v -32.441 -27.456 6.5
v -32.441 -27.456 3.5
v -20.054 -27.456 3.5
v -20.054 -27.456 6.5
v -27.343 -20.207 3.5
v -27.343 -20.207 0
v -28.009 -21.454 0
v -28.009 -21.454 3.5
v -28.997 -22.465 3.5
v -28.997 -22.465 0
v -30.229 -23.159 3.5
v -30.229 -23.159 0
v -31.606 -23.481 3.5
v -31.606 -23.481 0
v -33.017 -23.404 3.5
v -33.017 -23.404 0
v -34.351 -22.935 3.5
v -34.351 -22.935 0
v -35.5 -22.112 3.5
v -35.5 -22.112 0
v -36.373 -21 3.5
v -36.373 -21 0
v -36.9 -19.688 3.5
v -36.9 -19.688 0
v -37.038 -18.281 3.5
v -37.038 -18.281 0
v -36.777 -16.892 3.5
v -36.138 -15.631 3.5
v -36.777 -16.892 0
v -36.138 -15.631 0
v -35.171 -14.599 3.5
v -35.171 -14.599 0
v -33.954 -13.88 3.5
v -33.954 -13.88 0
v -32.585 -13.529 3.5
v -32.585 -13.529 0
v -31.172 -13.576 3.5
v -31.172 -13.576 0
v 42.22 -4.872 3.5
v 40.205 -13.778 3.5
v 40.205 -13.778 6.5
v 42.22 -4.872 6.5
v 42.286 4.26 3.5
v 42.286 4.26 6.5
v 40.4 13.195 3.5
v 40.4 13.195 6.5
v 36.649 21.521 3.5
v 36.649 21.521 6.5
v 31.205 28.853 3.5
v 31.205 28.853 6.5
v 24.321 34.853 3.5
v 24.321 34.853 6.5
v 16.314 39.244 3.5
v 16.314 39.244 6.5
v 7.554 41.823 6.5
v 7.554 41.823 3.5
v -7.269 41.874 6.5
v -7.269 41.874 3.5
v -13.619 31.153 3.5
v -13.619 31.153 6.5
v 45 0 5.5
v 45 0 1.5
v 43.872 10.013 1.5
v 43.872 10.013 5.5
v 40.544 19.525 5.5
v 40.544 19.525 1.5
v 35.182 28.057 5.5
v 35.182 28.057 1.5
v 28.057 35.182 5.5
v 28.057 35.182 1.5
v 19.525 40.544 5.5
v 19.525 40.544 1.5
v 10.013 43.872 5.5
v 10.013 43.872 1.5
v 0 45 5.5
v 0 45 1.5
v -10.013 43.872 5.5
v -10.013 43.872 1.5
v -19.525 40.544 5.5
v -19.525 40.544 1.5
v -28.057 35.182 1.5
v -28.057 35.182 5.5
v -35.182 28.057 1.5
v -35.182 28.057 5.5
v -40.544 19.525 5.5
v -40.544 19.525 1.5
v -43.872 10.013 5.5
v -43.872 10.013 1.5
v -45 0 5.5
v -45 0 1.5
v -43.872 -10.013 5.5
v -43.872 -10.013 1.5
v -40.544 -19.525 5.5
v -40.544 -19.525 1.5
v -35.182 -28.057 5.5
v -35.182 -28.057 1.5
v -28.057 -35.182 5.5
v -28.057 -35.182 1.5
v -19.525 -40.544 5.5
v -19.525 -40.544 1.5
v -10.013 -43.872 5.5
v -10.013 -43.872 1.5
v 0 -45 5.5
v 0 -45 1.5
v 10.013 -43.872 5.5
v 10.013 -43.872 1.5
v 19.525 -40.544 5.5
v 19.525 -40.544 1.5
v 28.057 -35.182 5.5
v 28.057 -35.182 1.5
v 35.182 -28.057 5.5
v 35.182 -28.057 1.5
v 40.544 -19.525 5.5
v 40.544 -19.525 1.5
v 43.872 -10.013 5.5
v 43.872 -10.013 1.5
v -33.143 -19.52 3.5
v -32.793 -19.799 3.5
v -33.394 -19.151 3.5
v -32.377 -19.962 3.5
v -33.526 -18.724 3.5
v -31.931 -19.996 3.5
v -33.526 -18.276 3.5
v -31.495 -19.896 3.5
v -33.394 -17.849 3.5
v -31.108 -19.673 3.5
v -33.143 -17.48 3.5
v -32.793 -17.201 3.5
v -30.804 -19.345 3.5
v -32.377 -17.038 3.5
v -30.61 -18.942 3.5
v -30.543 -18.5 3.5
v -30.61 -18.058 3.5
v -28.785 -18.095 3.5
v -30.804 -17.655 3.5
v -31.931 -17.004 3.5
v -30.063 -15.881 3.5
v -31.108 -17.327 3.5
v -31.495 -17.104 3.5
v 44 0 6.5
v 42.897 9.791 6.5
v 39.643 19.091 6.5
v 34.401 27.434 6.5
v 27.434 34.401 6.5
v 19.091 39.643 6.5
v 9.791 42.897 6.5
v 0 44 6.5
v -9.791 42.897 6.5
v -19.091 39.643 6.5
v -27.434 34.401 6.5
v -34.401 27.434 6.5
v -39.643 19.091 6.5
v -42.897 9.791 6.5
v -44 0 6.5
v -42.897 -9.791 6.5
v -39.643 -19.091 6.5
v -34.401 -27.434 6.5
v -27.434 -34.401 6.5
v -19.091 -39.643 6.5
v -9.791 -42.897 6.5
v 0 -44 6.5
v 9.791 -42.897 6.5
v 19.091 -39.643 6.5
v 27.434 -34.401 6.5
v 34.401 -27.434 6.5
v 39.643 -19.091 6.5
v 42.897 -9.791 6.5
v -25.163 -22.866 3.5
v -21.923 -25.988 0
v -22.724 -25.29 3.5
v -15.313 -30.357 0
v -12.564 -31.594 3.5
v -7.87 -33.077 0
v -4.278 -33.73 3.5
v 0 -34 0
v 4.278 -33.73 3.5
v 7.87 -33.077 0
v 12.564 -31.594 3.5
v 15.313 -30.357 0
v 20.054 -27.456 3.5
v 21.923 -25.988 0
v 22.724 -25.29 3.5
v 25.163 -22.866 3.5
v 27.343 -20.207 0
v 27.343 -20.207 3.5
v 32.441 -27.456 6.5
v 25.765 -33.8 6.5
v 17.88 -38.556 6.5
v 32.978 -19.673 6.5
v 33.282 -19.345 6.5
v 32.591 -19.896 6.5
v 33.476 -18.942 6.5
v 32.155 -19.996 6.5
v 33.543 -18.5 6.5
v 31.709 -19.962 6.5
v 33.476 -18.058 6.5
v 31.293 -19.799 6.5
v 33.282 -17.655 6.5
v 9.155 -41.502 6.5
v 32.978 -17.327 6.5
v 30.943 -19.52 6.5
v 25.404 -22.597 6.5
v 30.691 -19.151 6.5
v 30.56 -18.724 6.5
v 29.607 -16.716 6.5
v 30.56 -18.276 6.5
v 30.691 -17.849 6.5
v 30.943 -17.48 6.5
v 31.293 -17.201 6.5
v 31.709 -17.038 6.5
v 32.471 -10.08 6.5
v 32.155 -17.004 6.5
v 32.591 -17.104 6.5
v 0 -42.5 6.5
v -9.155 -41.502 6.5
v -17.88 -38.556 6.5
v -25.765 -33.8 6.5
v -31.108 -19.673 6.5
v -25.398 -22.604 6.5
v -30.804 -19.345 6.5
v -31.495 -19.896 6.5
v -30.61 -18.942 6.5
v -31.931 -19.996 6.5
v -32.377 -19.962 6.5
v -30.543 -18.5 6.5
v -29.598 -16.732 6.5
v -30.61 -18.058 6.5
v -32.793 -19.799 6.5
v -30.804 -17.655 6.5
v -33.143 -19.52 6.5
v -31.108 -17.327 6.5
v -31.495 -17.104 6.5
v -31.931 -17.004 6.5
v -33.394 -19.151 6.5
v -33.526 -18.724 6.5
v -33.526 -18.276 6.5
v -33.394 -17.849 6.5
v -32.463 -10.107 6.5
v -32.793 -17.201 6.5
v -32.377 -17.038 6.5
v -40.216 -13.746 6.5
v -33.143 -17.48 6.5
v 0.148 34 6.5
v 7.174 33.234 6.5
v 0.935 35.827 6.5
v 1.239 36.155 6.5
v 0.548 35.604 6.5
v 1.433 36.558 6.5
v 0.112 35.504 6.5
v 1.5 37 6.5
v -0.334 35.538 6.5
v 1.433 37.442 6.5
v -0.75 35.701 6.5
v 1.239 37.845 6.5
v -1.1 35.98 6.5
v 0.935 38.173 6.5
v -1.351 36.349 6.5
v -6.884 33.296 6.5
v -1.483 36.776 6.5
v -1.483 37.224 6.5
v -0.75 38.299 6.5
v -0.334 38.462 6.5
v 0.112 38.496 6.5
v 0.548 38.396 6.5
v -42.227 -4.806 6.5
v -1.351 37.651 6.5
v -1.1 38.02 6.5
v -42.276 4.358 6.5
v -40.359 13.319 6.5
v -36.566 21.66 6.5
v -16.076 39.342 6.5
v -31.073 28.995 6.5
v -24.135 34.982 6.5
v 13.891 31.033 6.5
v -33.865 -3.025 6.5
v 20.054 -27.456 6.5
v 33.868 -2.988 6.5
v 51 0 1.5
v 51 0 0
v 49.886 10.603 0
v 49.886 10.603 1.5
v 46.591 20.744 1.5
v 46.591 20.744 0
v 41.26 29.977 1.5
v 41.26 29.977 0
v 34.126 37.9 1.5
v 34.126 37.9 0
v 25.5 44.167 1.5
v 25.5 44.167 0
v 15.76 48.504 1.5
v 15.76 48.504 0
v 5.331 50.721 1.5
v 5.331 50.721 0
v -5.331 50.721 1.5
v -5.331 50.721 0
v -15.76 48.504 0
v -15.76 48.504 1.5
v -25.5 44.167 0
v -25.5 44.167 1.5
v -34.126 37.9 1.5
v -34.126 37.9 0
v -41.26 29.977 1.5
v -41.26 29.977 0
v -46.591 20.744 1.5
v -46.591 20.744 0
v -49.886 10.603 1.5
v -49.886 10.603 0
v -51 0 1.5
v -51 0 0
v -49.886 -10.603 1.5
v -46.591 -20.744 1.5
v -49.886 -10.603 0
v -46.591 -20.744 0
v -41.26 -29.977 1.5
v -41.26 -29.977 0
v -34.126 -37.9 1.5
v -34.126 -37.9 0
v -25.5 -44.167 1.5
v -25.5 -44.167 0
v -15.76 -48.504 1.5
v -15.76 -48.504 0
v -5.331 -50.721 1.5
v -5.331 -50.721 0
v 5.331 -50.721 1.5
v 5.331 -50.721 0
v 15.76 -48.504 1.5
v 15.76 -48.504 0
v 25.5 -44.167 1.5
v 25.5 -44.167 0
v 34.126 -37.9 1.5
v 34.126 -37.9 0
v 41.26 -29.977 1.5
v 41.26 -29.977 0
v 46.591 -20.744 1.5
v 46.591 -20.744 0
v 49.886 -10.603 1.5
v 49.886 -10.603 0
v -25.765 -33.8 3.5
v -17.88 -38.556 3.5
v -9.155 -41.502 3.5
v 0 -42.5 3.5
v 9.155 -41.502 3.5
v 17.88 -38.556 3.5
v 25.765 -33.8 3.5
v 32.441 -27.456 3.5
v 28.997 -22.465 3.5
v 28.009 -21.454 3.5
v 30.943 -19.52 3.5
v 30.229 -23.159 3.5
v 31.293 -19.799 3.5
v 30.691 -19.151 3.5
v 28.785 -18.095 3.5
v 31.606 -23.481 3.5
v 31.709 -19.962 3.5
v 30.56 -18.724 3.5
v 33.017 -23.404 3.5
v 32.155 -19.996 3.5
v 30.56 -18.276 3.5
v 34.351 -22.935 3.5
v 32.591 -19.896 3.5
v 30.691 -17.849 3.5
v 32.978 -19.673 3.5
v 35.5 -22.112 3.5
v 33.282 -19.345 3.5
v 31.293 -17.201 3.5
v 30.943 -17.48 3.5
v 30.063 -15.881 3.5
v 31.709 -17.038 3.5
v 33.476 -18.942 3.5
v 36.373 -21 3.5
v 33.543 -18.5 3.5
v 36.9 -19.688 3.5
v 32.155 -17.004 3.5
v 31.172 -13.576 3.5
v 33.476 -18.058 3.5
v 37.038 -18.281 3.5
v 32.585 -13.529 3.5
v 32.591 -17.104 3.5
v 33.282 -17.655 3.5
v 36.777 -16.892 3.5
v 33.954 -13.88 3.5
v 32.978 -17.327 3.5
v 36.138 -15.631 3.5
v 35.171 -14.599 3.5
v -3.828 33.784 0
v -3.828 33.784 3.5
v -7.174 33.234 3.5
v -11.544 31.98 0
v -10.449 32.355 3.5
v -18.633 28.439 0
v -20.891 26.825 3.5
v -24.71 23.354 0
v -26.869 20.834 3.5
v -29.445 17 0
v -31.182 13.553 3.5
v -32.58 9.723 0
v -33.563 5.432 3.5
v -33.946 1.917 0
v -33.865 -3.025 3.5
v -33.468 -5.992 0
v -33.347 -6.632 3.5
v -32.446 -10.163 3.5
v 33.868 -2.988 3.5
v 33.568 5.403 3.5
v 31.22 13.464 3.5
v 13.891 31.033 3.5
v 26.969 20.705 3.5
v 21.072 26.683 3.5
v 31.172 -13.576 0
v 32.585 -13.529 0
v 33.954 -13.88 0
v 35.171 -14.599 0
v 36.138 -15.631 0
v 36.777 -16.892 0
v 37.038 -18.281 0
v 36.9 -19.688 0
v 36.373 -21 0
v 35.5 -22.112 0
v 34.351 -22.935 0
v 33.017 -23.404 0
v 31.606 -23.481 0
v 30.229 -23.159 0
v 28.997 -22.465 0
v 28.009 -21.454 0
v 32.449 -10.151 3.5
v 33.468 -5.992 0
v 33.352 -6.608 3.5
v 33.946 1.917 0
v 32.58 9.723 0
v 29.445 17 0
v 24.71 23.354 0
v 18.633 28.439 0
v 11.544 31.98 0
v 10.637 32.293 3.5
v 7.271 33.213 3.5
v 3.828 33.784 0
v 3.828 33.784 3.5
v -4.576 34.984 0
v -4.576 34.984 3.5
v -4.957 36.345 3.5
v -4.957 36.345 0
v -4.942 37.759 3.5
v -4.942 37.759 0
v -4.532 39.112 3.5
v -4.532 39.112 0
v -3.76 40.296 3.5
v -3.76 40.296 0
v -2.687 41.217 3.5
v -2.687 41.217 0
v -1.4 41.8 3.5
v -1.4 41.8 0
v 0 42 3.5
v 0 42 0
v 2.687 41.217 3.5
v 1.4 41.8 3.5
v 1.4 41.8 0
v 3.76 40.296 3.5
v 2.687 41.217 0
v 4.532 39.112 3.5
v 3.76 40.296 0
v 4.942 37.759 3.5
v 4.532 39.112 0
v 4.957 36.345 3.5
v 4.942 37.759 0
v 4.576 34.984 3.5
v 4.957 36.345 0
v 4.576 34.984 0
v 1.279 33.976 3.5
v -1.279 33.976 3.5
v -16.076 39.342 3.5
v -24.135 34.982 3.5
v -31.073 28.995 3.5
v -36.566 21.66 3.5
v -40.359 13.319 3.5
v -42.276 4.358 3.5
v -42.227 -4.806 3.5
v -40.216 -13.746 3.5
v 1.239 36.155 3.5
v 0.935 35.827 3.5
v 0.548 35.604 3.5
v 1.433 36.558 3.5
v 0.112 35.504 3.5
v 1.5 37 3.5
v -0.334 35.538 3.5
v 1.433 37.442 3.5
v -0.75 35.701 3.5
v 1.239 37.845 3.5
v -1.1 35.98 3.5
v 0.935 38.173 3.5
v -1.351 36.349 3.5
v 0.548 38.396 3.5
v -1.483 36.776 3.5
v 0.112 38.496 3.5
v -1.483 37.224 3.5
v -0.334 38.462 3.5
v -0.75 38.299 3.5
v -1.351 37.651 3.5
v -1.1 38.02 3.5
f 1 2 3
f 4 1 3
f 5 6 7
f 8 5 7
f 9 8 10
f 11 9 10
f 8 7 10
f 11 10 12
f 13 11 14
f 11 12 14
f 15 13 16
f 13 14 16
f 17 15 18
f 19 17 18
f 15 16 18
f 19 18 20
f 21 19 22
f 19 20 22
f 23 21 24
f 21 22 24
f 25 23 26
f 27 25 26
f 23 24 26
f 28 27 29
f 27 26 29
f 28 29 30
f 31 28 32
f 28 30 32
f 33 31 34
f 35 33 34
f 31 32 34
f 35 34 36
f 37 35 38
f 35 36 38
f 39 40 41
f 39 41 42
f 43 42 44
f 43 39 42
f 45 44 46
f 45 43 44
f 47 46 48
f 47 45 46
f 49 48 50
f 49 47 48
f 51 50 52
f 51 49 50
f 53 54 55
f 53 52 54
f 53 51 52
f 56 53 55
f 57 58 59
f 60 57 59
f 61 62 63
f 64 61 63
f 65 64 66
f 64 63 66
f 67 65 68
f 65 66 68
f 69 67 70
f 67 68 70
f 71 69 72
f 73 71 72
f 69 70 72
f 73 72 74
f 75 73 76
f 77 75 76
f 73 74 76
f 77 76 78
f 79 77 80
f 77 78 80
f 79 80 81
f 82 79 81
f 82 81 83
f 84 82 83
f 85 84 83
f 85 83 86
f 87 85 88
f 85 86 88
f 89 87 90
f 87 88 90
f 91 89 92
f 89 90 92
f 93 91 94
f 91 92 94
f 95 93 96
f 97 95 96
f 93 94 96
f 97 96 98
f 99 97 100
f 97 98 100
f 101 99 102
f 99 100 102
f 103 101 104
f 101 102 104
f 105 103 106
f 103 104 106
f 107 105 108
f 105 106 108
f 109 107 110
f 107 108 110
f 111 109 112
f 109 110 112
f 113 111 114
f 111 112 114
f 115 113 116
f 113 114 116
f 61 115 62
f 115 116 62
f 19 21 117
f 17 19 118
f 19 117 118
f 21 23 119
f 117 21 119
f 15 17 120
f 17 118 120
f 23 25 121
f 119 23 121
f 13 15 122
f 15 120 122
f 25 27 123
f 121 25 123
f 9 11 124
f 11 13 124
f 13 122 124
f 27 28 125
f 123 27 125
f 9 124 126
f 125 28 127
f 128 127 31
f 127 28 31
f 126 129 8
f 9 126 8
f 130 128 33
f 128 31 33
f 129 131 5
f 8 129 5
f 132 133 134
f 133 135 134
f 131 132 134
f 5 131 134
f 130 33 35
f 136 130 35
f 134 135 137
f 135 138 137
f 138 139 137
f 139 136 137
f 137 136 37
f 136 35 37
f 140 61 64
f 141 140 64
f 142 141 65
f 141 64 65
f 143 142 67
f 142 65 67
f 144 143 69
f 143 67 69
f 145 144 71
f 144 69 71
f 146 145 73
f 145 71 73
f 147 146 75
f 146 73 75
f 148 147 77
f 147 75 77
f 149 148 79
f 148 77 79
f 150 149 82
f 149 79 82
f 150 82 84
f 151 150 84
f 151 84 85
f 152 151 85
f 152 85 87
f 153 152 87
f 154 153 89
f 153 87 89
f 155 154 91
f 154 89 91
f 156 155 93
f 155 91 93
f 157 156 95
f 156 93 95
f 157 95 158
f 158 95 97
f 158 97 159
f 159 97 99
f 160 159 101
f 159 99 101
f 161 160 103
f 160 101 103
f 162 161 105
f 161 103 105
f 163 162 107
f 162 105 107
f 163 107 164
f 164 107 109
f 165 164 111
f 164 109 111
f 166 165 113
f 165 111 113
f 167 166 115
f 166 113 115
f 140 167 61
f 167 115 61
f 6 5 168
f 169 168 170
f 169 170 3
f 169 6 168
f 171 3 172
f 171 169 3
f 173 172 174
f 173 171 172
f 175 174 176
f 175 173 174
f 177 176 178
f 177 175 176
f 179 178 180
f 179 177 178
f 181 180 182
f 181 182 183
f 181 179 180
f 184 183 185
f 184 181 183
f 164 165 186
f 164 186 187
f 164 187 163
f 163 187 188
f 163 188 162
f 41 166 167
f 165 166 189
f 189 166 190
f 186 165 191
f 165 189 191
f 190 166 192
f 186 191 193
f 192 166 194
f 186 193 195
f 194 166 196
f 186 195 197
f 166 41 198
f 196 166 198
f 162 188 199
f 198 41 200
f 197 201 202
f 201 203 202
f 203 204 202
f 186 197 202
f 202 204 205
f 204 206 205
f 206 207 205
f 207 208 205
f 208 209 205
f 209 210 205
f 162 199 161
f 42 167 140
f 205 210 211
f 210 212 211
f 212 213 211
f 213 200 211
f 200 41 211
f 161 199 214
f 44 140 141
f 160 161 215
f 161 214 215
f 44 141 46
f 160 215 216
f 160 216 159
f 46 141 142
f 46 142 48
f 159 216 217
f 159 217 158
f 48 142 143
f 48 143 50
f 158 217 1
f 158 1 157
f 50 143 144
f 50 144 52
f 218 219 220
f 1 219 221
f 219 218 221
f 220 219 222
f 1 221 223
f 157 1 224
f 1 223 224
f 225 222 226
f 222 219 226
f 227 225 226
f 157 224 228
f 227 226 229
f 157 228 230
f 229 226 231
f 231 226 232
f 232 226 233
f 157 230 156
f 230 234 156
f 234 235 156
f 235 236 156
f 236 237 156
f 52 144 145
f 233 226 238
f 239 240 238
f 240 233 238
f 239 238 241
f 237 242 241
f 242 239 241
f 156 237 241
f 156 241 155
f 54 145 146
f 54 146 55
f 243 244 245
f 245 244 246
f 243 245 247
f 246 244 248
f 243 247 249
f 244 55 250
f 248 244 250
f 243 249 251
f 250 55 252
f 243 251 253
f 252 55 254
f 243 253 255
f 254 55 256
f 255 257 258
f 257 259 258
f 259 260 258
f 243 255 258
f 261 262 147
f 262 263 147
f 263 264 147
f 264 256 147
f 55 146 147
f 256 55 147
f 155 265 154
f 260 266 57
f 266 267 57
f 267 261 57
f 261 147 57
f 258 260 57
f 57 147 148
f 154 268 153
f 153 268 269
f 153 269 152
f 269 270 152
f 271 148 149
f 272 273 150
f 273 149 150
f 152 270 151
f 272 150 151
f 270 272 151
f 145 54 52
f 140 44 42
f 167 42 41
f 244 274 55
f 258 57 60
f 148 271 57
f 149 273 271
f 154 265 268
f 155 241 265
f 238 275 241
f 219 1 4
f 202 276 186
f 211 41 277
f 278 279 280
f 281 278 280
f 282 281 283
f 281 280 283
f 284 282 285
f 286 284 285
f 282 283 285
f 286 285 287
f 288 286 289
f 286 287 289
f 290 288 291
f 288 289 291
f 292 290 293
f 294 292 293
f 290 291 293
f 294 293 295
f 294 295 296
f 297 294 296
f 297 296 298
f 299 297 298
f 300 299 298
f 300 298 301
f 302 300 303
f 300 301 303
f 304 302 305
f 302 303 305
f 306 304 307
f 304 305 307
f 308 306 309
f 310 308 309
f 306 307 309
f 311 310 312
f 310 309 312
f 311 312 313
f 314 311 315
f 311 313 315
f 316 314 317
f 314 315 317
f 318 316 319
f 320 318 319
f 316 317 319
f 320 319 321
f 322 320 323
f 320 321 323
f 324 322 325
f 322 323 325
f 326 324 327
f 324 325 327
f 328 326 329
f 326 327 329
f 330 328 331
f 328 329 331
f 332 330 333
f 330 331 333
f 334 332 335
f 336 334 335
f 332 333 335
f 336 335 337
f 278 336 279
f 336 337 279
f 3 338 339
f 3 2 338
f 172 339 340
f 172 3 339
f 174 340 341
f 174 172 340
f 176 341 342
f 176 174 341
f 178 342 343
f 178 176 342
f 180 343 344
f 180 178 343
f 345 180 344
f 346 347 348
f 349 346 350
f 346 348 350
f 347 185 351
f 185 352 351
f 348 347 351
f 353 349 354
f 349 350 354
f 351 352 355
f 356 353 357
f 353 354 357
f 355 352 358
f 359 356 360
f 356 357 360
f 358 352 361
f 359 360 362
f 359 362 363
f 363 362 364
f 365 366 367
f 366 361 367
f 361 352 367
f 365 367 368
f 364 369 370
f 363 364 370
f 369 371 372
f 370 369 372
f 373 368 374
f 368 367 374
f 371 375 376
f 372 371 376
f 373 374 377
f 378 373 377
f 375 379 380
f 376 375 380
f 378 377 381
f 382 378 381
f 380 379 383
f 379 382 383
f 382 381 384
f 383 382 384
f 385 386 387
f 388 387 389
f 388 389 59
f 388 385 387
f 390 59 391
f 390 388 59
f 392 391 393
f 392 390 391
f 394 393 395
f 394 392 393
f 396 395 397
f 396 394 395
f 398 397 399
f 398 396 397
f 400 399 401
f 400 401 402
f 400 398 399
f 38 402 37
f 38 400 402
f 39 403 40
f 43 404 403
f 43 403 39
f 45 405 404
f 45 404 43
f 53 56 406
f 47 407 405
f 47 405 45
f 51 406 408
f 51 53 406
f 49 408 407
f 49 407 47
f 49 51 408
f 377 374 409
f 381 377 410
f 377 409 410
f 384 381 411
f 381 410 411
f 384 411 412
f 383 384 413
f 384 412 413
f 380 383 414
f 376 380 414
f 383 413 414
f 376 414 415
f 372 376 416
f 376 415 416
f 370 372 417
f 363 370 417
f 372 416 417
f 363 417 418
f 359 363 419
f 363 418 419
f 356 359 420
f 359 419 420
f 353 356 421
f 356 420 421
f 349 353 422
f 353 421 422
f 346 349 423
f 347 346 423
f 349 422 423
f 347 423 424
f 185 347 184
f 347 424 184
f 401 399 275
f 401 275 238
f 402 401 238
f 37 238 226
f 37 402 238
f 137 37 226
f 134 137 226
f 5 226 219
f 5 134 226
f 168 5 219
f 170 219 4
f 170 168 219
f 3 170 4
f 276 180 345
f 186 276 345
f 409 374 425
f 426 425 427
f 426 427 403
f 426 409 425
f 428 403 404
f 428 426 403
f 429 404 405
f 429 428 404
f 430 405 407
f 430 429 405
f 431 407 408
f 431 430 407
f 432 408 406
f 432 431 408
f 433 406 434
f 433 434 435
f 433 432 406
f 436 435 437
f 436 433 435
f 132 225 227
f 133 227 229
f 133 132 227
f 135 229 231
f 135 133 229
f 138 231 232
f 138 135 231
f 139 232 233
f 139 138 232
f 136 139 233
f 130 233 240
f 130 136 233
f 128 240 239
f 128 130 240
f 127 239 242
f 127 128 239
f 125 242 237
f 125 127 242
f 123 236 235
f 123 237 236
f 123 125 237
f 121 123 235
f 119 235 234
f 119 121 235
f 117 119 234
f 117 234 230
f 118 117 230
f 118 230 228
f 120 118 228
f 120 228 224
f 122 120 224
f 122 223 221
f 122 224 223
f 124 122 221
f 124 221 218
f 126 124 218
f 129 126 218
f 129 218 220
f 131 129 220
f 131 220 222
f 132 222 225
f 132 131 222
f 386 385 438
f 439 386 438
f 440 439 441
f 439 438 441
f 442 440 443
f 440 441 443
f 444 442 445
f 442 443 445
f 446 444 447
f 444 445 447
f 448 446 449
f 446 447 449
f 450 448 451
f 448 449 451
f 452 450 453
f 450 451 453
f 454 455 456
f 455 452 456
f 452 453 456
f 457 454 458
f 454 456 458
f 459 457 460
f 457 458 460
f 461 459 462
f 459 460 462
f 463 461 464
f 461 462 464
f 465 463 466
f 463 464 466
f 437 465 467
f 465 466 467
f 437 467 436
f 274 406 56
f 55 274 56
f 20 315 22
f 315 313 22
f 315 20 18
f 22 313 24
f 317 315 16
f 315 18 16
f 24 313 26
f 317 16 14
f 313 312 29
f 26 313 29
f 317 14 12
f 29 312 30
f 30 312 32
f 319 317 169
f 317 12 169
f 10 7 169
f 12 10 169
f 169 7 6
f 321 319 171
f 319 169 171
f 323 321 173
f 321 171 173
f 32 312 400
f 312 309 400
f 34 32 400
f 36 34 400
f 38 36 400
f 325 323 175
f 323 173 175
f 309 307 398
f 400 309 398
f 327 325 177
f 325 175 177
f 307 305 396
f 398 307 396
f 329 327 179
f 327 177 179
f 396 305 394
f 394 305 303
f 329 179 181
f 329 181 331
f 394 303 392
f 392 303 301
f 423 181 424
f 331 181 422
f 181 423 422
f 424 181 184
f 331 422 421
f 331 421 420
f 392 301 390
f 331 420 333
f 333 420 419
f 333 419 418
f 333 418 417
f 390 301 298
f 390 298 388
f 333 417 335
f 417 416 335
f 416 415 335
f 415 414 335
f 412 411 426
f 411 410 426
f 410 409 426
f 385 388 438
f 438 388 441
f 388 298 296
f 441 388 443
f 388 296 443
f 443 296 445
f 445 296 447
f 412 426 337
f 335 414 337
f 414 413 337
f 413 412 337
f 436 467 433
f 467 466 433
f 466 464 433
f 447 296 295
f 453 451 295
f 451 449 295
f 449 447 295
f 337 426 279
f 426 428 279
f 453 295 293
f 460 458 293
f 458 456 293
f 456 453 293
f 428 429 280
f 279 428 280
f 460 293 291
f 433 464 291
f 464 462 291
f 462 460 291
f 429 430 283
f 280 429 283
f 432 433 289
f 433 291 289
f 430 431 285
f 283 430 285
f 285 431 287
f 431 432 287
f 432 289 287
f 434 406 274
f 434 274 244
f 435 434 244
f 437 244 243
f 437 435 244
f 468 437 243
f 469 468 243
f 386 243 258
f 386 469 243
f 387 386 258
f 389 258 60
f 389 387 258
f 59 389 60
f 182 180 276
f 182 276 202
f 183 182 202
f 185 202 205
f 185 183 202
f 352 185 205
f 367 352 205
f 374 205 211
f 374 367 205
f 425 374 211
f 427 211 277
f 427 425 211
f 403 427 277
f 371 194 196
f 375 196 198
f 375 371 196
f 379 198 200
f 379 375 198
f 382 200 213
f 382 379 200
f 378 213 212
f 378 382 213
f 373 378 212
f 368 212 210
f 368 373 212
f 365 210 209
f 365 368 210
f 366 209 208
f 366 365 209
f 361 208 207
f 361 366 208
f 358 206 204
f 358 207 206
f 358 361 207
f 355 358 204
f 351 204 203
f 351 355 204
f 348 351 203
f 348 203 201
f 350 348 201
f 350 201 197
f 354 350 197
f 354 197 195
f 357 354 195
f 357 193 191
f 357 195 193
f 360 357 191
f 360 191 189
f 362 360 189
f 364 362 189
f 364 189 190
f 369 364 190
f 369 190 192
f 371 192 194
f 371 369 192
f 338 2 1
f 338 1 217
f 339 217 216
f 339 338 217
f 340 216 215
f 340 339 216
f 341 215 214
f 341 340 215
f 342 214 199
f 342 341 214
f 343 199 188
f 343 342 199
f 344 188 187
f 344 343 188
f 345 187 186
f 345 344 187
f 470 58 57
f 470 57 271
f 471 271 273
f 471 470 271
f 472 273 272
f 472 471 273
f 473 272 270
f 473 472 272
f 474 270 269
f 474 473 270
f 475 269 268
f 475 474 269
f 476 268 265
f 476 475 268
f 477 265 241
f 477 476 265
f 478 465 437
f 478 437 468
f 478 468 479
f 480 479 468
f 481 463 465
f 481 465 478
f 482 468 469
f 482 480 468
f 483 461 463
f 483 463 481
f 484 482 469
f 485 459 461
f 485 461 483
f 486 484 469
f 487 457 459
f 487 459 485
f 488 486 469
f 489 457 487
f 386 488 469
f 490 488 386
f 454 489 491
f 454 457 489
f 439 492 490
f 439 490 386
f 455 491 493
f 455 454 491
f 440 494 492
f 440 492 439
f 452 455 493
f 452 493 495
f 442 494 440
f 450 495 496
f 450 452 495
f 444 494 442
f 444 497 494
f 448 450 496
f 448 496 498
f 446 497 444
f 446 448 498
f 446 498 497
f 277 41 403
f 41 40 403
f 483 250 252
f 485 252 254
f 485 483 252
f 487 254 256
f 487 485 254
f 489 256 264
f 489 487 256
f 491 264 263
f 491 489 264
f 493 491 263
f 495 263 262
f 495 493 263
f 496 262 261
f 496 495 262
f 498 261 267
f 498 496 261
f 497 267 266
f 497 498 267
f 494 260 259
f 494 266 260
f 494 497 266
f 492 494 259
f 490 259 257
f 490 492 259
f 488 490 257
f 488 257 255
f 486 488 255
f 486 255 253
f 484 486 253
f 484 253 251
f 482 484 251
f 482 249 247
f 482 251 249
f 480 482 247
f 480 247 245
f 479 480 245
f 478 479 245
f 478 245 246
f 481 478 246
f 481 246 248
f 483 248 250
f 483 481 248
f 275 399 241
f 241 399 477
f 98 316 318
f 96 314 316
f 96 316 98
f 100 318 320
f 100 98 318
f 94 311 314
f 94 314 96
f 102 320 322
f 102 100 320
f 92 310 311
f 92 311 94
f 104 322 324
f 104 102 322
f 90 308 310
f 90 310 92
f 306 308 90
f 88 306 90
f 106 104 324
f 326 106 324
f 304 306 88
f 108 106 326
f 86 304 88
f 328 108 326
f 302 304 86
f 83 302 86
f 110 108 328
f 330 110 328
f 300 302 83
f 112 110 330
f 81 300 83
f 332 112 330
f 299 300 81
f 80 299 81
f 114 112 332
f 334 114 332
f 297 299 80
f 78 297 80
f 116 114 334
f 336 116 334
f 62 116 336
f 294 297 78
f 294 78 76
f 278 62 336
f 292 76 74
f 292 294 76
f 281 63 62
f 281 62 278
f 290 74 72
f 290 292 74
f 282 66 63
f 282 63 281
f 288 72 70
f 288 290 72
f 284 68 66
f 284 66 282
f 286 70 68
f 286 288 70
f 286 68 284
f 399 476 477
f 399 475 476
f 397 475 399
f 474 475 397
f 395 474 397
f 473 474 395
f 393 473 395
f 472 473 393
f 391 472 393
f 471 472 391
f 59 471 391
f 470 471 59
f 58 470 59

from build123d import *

# Parameters (mm, degrees)
SKETCH_R          = 51
SKETCH_R_2        = 34
PAD_DEPTH         = 1.5
SKETCH001_R       = 45
SKETCH001_R_2     = 42.5
PAD001_DEPTH      = 5
SKETCH002_R       = 43
SKETCH002_R_2     = 34
PAD002_DEPTH      = 2
SKETCH004_R       = 5
POCKET001_DEPTH   = 3.5
PAD003_DEPTH      = 3
SKETCH003_R       = 1.5
POCKET_DEPTH      = 3.501
POCKET_DEPTH_BACK = -3.001
CHAMFER_SIZE      = 1


with BuildPart() as part:
    # Sketch → Pad (new body)
    with BuildSketch(Plane.XY):
        Circle(SKETCH_R)
        Circle(SKETCH_R_2, mode=Mode.SUBTRACT)
    extrude(amount=PAD_DEPTH)

    # Sketch001 (on Face4 of Pad) → Pad001 (join)
    with BuildSketch(Plane.XY.offset(1.5)):
        Circle(SKETCH001_R)
        Circle(SKETCH001_R_2, mode=Mode.SUBTRACT)
    extrude(amount=PAD001_DEPTH)

    # Sketch002 (on Face6 of Pad001) → Pad002 (join)
    with BuildSketch(Plane.XY.offset(1.5)):
        Circle(SKETCH002_R)
        Circle(SKETCH002_R_2, mode=Mode.SUBTRACT)
    extrude(amount=PAD002_DEPTH)

    # Sketch004 → Pocket001 (cut)
    with BuildSketch(Plane(origin=(0, 0, 0), x_dir=(1, 0, 0), z_dir=(0, 0, -1))):
        with Locations((32.04294, 18.5)):
            Circle(SKETCH004_R)
        with Locations((-32.04294, 18.5)):
            Circle(SKETCH004_R)
        with Locations((0, -37)):
            Circle(SKETCH004_R)
    extrude(amount=-POCKET001_DEPTH, mode=Mode.SUBTRACT)

    # Sketch005 (on Face19 of Pocket001) → Pad003 (join)
    with BuildSketch(Plane.XY.offset(3.5)):
        with BuildLine():
            ThreePointArc((13.890561, 31.033084), (0.148301, 33.999677), (-13.619315, 31.153078))
            Line((-7.268789, 41.873795), (-13.619315, 31.153078))
            ThreePointArc((7.554436, 41.823205), (0.145046, 42.499752), (-7.268789, 41.873795))
            Line((13.890561, 31.033084), (7.554436, 41.823205))
        make_face()
        with BuildLine():
            ThreePointArc((-40.215676, -13.745888), (-36.969341, -20.96468), (-32.440728, -27.456314))
            Line((-32.440728, -27.456314), (-20.053698, -27.456314))
            ThreePointArc((-33.865149, -3.025171), (-29.597816, -16.732283), (-20.053698, -27.456314))
            Line((-33.865149, -3.025171), (-40.215676, -13.745888))
        make_face()
        with BuildLine():
            Line((40.204551, -13.778393), (33.868425, -2.988272))
            ThreePointArc((20.053698, -27.456314), (29.606927, -16.716156), (33.868425, -2.988272))
            Line((20.053698, -27.456314), (32.440728, -27.456314))
            ThreePointArc((32.440728, -27.456314), (36.960864, -20.979621), (40.204551, -13.778393))
        make_face()
    extrude(amount=PAD003_DEPTH)

    # Sketch003 (on Face8 of Pad002) → Pocket (cut, two sides)
    with BuildSketch(Plane.XY.offset(3.5)) as pocket_sk:
        with Locations((0, 37)):
            Circle(SKETCH003_R)
        with Locations((32.04294, -18.5)):
            Circle(SKETCH003_R)
        with Locations((-32.04294, -18.5)):
            Circle(SKETCH003_R)
    extrude(amount=-POCKET_DEPTH, mode=Mode.SUBTRACT)
    extrude(pocket_sk.sketch, amount=-POCKET_DEPTH_BACK, mode=Mode.SUBTRACT)

    # Chamfer
    chamfer_edges = [part.edges().sort_by_distance(p)[0] for p in [
        (-45, 0, 6.5),
    ]]
    chamfer(chamfer_edges, length=CHAMFER_SIZE)


solid = part.part
